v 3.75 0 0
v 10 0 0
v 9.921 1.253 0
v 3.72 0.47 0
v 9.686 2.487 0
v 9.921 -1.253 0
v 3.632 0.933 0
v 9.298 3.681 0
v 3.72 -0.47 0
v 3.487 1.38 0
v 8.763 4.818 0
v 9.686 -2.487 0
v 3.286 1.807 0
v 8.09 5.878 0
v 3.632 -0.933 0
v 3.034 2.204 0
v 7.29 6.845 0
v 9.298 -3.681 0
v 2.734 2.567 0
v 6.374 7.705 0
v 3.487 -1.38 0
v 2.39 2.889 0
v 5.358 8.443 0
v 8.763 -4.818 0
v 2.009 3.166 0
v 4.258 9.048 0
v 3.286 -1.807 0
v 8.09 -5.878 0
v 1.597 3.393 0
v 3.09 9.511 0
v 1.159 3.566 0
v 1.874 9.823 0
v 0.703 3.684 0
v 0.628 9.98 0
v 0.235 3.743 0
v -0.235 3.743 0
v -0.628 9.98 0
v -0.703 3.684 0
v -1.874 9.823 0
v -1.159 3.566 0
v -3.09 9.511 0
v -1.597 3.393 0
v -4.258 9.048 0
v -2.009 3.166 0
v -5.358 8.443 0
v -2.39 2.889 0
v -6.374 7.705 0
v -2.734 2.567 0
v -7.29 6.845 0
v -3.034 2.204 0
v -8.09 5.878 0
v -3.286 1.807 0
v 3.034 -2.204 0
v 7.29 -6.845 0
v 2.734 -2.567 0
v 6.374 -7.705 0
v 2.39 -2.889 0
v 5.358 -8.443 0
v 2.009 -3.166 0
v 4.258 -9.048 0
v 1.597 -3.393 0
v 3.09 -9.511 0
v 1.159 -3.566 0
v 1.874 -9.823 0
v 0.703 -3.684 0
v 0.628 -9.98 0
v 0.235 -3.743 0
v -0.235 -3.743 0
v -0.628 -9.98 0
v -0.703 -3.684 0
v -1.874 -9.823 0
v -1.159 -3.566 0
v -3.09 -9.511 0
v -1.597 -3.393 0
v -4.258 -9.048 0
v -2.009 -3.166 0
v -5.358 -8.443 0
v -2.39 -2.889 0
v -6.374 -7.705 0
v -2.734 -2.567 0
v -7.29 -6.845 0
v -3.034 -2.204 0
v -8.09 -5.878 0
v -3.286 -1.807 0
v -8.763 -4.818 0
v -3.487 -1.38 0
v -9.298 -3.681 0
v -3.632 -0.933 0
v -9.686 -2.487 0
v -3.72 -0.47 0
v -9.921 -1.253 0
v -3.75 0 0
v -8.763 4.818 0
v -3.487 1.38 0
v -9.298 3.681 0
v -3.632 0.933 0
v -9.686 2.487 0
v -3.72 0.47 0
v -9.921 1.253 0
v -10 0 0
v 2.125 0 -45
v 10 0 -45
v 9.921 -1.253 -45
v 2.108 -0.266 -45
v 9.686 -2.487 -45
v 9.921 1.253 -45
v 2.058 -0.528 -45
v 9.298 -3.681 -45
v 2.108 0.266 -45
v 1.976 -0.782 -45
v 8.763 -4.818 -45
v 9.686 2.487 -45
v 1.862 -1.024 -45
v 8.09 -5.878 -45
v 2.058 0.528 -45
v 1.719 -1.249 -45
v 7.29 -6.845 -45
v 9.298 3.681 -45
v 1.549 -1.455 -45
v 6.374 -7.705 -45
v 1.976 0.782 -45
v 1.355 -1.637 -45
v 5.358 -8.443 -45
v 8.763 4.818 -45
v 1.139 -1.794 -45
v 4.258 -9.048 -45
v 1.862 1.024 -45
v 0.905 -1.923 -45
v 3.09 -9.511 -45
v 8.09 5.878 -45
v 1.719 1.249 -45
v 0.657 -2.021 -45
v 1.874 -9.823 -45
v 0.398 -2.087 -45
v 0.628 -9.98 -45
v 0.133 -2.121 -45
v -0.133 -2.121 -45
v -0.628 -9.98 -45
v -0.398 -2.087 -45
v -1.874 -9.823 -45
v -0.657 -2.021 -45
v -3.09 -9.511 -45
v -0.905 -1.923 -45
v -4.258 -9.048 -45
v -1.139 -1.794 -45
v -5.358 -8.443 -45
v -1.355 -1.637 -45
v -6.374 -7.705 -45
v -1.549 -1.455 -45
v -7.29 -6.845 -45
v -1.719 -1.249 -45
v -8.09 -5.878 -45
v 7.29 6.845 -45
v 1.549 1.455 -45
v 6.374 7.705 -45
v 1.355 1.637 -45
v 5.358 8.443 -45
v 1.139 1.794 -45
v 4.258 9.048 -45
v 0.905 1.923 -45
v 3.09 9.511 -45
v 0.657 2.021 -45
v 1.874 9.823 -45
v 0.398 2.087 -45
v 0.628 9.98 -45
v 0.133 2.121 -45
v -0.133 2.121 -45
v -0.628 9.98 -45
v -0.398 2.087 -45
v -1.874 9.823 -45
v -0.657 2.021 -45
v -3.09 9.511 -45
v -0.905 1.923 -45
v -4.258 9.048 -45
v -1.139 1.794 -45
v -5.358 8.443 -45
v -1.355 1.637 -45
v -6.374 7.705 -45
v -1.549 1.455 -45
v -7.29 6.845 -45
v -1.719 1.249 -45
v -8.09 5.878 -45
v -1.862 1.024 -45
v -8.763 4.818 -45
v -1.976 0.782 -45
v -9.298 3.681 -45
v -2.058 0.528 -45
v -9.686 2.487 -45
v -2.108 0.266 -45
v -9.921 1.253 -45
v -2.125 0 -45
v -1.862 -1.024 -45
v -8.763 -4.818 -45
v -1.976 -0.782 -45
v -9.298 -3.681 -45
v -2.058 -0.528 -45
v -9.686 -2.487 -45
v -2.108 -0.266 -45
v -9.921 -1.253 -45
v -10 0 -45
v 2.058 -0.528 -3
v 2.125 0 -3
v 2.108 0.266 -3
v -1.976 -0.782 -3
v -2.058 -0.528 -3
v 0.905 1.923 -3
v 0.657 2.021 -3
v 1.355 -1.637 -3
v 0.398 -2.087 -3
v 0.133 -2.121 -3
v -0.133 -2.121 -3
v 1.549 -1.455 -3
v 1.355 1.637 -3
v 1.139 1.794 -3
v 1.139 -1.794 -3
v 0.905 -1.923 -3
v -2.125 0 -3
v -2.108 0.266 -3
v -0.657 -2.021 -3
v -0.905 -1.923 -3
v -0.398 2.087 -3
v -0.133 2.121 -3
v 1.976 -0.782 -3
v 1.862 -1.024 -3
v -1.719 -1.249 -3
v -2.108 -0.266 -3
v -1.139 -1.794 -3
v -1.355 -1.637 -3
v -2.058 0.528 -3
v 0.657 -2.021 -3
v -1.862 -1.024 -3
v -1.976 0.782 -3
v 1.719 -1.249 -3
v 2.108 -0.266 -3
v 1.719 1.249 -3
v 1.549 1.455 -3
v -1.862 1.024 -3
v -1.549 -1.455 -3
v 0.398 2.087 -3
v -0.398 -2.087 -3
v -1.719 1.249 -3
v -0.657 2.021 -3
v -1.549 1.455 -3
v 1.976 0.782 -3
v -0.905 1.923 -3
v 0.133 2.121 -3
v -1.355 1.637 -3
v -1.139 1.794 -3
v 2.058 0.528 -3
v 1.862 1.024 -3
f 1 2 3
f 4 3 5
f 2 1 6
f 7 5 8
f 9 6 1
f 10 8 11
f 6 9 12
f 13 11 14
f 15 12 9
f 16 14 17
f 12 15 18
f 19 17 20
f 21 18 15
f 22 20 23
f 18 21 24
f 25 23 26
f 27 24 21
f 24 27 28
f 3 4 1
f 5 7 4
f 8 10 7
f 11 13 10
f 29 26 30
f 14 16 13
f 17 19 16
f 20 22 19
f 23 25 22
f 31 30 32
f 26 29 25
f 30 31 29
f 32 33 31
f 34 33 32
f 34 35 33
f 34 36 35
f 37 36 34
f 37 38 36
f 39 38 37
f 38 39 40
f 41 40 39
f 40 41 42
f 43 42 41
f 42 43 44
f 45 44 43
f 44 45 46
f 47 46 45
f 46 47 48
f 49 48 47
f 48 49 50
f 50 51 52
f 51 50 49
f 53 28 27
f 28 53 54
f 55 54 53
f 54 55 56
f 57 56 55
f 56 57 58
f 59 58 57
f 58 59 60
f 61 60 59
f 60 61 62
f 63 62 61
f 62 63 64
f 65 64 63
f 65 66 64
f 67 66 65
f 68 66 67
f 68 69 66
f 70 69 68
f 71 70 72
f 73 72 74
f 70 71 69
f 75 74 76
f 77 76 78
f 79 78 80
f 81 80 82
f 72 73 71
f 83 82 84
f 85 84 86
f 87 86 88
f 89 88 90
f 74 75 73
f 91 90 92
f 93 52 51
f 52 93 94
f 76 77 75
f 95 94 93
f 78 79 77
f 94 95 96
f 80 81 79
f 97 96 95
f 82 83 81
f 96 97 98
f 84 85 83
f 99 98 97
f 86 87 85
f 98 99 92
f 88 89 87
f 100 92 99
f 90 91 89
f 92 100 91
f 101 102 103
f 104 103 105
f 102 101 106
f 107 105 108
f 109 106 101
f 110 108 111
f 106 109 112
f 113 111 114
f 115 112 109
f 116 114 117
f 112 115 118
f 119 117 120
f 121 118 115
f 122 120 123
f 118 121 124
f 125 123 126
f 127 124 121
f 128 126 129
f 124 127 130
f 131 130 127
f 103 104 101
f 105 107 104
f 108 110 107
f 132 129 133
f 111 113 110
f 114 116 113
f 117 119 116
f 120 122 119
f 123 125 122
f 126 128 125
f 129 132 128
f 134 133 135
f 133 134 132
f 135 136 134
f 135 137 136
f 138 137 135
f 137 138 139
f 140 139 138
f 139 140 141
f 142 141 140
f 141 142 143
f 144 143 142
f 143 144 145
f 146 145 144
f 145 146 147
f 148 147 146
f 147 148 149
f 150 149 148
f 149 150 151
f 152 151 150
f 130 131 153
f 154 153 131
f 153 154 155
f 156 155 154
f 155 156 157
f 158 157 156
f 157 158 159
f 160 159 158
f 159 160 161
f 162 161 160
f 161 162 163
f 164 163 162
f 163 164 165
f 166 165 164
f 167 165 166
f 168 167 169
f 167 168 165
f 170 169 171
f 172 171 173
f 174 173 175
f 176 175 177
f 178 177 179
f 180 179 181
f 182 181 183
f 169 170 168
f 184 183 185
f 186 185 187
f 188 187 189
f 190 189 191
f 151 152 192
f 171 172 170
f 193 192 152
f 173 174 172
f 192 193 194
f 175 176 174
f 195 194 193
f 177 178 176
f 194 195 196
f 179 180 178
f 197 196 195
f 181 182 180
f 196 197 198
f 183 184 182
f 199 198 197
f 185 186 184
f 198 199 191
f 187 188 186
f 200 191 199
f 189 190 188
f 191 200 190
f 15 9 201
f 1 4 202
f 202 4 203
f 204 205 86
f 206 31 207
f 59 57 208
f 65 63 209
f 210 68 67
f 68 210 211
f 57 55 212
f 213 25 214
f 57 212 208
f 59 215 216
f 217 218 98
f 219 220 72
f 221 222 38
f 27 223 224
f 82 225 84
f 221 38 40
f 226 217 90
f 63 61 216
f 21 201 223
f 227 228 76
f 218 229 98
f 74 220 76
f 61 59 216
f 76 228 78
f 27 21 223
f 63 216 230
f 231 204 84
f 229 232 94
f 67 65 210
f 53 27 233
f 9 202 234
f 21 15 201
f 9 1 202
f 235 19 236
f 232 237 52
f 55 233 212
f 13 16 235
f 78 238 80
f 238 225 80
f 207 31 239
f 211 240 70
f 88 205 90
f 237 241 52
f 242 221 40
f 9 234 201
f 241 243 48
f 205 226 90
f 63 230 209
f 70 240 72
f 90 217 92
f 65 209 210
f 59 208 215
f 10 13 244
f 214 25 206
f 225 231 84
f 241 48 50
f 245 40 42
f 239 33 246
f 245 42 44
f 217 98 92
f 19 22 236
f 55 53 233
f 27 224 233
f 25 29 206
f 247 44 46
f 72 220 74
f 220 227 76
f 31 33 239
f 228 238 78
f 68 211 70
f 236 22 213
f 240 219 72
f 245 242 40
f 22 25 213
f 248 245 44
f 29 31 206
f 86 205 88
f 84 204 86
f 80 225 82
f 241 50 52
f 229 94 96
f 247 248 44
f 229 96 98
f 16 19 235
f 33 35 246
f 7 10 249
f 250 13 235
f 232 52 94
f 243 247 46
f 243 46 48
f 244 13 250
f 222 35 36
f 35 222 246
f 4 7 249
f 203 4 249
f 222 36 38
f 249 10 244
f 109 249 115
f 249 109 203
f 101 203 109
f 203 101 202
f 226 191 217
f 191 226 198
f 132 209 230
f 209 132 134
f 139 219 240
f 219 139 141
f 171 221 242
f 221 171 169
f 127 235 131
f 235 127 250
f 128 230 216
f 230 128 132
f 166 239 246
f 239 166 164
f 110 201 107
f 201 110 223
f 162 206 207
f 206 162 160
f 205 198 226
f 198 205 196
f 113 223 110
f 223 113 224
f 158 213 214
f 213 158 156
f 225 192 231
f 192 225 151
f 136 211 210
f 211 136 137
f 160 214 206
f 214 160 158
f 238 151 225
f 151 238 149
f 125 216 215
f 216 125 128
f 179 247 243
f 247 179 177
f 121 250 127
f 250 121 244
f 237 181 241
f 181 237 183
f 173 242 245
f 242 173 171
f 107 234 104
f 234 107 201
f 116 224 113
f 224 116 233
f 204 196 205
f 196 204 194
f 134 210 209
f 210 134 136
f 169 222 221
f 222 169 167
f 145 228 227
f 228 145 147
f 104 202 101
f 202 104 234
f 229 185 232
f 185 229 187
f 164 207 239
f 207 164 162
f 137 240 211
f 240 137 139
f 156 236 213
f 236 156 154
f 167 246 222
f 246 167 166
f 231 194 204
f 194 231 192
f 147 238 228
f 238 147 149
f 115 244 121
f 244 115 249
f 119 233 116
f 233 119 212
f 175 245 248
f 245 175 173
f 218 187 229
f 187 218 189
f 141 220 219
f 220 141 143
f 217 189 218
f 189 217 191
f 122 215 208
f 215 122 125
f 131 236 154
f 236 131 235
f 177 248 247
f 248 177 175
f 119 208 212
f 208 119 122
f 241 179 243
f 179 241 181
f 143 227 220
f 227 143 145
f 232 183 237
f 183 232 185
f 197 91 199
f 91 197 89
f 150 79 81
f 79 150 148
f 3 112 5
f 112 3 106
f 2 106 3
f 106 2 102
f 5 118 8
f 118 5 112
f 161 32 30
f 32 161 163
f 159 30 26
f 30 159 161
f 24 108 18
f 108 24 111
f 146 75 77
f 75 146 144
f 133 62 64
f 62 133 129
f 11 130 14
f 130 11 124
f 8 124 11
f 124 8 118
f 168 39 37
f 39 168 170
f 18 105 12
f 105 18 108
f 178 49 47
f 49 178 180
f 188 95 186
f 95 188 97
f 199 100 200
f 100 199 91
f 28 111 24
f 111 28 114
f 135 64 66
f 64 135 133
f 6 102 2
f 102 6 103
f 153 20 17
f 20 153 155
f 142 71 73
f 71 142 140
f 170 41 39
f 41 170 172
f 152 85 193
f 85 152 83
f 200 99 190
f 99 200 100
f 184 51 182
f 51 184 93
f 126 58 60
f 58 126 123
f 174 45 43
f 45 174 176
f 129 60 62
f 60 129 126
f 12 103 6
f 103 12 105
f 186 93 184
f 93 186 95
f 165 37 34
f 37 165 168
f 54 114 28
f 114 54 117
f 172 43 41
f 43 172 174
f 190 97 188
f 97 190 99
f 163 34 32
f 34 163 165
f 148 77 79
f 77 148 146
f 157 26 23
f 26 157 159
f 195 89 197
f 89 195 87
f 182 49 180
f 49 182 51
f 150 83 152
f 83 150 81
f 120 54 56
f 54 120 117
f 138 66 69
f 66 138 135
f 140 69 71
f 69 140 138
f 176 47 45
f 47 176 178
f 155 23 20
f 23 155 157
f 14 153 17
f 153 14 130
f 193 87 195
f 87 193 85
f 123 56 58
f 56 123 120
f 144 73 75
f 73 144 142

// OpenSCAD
$fn = 50;


difference() {
	union() {
		translate(v = [0, 0, -45.0000000000]) {
			cylinder(h = 45, r = 10.0000000000);
		}
		cylinder(h = 0, r = 13.0000000000);
	}
	union() {
		translate(v = [0, 0, 0]) {
			rotate(a = [0, 0, 0]) {
				difference() {
					union() {
						#translate(v = [0, 0, -45.0000000000]) {
							cylinder(h = 45, r = 2.0000000000);
						}
						#translate(v = [0, 0, -3]) {
							cylinder(h = 3, r = 10.0000000000, r1 = 2.1250000000, r2 = 3.7500000000);
						}
						#translate(v = [0, 0, -45.0000000000]) {
							cylinder(h = 45, r = 2.1250000000);
						}
						#translate(v = [0, 0, -45.0000000000]) {
							cylinder(h = 45, r = 2.0000000000);
						}
					}
					union();
				}
			}
		}
	}
}
